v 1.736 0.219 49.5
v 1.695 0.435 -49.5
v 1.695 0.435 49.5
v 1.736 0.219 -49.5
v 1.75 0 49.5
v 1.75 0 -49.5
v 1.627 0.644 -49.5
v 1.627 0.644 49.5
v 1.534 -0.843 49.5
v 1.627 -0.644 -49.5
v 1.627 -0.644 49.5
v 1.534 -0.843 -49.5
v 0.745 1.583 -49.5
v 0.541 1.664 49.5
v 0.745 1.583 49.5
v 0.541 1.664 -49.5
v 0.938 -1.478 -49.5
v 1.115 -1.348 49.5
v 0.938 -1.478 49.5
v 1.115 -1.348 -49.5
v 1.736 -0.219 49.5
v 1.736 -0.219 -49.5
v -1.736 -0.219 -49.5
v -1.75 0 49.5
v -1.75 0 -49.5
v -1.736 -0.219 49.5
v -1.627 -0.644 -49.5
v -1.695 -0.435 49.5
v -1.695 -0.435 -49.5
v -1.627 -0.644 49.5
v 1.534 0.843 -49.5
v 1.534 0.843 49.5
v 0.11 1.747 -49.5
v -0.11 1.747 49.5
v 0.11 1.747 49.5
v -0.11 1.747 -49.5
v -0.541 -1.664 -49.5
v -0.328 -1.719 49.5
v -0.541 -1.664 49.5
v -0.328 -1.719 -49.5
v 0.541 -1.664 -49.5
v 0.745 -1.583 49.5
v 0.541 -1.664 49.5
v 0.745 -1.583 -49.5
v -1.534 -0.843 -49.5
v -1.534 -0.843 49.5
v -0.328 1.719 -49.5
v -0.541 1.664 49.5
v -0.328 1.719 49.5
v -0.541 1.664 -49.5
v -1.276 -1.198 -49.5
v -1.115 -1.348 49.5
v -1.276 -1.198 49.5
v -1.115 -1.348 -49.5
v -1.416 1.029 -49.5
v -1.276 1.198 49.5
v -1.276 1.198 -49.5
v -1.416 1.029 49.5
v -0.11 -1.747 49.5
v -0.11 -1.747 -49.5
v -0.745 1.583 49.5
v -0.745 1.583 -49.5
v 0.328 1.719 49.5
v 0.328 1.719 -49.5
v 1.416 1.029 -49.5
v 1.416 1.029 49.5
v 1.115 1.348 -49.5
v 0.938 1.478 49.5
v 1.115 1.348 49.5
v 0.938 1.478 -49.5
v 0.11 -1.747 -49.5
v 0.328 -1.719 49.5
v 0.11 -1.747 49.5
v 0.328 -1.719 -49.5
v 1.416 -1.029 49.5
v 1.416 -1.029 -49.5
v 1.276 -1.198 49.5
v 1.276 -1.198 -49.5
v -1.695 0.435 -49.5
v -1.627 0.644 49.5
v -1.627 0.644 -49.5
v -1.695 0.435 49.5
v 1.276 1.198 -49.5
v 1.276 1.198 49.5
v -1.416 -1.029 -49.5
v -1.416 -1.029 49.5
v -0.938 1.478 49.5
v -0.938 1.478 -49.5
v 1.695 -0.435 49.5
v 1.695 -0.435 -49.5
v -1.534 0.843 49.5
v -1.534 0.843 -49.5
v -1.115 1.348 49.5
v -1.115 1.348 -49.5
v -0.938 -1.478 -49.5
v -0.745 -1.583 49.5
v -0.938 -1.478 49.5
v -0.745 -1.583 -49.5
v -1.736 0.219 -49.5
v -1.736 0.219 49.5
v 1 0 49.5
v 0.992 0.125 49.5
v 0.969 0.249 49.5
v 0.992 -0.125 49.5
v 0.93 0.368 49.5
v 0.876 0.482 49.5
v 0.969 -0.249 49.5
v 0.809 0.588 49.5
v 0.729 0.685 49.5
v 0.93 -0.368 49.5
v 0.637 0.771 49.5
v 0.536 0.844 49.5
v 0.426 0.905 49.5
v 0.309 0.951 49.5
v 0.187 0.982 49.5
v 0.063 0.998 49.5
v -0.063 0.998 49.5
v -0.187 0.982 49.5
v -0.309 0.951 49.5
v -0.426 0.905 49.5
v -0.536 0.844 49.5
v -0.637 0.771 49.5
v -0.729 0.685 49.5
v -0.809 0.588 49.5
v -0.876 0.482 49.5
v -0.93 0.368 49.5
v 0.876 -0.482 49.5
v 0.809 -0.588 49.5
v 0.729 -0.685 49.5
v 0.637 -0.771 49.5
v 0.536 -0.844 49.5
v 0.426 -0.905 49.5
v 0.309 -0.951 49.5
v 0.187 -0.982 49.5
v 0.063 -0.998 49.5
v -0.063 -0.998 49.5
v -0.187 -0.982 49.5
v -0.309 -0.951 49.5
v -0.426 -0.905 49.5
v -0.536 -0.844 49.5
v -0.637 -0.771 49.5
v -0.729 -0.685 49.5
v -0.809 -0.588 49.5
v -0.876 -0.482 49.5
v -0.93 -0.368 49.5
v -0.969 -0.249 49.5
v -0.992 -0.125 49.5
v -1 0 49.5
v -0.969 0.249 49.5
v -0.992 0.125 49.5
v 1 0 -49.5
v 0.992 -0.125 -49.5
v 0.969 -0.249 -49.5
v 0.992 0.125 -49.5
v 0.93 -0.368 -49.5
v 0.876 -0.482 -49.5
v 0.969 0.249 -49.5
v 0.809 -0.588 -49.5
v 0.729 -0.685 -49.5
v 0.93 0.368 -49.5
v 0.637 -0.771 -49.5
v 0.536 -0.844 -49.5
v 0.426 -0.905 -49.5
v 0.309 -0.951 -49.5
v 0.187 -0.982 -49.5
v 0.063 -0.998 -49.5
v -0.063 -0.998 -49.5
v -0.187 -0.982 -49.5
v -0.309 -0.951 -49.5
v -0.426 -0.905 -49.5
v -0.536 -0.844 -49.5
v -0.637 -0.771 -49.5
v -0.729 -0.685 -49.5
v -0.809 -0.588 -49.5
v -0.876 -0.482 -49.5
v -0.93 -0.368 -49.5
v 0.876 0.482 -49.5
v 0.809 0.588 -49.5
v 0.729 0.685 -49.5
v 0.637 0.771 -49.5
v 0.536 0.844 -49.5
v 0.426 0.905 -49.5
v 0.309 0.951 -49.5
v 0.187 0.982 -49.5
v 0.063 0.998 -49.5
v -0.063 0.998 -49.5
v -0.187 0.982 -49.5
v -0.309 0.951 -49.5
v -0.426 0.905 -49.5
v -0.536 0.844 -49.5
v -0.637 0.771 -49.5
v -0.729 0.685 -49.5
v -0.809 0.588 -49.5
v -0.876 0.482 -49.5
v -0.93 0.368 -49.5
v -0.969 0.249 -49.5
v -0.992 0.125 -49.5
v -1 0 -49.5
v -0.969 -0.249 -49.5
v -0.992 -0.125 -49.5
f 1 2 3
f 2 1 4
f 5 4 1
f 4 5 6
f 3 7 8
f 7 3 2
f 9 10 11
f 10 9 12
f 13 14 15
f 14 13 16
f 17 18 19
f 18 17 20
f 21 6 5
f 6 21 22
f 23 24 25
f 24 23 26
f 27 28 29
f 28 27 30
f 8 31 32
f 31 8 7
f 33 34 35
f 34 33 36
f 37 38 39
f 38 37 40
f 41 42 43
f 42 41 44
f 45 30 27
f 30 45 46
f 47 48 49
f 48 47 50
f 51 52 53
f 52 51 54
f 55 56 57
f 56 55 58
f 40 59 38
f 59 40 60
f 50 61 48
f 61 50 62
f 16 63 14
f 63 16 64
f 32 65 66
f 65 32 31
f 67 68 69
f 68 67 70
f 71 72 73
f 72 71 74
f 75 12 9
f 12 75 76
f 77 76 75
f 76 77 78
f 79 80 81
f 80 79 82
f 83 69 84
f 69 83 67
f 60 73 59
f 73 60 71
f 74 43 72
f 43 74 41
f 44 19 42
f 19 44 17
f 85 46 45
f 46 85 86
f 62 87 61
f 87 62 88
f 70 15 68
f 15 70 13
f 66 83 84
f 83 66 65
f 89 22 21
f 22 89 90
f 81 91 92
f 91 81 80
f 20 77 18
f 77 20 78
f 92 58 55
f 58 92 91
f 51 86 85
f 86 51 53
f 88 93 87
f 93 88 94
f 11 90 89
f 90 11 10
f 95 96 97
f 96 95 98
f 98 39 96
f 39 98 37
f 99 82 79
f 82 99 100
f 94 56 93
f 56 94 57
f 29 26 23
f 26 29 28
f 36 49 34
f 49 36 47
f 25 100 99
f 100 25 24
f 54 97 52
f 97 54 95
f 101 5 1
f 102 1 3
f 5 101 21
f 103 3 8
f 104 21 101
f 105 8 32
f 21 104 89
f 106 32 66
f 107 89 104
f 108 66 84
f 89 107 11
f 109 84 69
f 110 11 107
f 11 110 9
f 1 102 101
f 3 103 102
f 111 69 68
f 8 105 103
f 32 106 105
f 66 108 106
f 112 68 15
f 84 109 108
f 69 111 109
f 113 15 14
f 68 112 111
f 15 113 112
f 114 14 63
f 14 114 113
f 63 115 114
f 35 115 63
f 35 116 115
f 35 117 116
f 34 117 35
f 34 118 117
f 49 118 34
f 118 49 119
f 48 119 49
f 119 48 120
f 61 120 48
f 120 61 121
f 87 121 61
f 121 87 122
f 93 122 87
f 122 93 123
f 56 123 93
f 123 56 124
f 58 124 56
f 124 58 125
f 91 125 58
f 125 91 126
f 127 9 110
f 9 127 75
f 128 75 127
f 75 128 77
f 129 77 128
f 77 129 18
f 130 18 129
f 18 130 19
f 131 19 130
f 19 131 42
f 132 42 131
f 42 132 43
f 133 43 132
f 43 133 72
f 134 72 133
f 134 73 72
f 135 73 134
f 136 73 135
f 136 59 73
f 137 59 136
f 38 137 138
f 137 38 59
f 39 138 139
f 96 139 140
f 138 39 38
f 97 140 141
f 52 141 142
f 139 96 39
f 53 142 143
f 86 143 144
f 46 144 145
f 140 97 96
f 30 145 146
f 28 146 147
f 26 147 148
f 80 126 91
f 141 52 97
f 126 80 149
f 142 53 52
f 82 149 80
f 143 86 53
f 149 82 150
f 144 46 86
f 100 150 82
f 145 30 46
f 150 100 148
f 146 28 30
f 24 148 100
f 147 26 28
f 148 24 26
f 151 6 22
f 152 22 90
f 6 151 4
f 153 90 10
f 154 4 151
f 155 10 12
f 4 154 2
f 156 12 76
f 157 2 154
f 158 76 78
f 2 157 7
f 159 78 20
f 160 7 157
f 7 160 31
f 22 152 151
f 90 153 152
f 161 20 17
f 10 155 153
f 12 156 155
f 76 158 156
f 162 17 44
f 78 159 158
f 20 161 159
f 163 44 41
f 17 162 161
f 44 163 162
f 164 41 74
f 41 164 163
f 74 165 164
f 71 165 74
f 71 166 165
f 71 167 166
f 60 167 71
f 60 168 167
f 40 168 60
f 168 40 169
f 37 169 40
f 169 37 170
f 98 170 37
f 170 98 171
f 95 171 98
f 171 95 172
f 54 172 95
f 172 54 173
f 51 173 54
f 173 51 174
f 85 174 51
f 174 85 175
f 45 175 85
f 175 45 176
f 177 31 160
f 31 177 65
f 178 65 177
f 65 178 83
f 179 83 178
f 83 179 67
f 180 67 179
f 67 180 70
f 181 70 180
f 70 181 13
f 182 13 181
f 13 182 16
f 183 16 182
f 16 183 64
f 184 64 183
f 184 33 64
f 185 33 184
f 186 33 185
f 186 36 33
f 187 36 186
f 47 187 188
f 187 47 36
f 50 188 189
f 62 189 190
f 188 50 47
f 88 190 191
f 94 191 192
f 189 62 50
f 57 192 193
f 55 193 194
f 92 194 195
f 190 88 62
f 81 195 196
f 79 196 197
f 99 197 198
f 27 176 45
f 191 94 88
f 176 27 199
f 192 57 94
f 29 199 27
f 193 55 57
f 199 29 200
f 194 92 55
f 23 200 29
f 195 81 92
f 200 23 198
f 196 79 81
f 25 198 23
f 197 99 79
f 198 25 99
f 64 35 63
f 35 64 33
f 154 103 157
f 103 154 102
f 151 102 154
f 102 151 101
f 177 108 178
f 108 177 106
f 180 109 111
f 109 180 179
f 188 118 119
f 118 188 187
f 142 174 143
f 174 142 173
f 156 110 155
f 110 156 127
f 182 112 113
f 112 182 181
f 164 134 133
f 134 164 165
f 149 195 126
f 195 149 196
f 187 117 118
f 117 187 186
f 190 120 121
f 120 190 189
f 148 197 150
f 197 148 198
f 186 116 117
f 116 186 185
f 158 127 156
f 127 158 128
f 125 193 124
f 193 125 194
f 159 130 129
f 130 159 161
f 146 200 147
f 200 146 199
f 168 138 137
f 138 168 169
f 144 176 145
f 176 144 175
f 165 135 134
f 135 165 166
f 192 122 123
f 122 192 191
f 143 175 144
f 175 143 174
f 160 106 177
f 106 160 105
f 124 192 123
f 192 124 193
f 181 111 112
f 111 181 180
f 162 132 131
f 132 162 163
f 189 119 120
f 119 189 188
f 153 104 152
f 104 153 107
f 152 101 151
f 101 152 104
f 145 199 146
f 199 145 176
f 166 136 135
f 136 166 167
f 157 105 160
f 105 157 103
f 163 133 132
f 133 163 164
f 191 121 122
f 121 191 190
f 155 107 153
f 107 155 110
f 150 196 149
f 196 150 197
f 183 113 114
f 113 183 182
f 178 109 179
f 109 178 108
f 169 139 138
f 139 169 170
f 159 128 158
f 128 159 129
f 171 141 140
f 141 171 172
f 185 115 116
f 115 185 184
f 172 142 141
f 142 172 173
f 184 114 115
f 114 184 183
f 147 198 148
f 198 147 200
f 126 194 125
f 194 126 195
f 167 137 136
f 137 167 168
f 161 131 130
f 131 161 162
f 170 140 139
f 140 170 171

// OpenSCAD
$fn = 50;


difference() {
	union() {
		translate(v = [0, 0, -49.5000000000]) {
			cylinder(h = 99, r = 1.7500000000);
		}
	}
	union() {
		translate(v = [0, 0, -100.0000000000]) {
			cylinder(h = 200, r = 1.0000000000);
		}
	}
}
